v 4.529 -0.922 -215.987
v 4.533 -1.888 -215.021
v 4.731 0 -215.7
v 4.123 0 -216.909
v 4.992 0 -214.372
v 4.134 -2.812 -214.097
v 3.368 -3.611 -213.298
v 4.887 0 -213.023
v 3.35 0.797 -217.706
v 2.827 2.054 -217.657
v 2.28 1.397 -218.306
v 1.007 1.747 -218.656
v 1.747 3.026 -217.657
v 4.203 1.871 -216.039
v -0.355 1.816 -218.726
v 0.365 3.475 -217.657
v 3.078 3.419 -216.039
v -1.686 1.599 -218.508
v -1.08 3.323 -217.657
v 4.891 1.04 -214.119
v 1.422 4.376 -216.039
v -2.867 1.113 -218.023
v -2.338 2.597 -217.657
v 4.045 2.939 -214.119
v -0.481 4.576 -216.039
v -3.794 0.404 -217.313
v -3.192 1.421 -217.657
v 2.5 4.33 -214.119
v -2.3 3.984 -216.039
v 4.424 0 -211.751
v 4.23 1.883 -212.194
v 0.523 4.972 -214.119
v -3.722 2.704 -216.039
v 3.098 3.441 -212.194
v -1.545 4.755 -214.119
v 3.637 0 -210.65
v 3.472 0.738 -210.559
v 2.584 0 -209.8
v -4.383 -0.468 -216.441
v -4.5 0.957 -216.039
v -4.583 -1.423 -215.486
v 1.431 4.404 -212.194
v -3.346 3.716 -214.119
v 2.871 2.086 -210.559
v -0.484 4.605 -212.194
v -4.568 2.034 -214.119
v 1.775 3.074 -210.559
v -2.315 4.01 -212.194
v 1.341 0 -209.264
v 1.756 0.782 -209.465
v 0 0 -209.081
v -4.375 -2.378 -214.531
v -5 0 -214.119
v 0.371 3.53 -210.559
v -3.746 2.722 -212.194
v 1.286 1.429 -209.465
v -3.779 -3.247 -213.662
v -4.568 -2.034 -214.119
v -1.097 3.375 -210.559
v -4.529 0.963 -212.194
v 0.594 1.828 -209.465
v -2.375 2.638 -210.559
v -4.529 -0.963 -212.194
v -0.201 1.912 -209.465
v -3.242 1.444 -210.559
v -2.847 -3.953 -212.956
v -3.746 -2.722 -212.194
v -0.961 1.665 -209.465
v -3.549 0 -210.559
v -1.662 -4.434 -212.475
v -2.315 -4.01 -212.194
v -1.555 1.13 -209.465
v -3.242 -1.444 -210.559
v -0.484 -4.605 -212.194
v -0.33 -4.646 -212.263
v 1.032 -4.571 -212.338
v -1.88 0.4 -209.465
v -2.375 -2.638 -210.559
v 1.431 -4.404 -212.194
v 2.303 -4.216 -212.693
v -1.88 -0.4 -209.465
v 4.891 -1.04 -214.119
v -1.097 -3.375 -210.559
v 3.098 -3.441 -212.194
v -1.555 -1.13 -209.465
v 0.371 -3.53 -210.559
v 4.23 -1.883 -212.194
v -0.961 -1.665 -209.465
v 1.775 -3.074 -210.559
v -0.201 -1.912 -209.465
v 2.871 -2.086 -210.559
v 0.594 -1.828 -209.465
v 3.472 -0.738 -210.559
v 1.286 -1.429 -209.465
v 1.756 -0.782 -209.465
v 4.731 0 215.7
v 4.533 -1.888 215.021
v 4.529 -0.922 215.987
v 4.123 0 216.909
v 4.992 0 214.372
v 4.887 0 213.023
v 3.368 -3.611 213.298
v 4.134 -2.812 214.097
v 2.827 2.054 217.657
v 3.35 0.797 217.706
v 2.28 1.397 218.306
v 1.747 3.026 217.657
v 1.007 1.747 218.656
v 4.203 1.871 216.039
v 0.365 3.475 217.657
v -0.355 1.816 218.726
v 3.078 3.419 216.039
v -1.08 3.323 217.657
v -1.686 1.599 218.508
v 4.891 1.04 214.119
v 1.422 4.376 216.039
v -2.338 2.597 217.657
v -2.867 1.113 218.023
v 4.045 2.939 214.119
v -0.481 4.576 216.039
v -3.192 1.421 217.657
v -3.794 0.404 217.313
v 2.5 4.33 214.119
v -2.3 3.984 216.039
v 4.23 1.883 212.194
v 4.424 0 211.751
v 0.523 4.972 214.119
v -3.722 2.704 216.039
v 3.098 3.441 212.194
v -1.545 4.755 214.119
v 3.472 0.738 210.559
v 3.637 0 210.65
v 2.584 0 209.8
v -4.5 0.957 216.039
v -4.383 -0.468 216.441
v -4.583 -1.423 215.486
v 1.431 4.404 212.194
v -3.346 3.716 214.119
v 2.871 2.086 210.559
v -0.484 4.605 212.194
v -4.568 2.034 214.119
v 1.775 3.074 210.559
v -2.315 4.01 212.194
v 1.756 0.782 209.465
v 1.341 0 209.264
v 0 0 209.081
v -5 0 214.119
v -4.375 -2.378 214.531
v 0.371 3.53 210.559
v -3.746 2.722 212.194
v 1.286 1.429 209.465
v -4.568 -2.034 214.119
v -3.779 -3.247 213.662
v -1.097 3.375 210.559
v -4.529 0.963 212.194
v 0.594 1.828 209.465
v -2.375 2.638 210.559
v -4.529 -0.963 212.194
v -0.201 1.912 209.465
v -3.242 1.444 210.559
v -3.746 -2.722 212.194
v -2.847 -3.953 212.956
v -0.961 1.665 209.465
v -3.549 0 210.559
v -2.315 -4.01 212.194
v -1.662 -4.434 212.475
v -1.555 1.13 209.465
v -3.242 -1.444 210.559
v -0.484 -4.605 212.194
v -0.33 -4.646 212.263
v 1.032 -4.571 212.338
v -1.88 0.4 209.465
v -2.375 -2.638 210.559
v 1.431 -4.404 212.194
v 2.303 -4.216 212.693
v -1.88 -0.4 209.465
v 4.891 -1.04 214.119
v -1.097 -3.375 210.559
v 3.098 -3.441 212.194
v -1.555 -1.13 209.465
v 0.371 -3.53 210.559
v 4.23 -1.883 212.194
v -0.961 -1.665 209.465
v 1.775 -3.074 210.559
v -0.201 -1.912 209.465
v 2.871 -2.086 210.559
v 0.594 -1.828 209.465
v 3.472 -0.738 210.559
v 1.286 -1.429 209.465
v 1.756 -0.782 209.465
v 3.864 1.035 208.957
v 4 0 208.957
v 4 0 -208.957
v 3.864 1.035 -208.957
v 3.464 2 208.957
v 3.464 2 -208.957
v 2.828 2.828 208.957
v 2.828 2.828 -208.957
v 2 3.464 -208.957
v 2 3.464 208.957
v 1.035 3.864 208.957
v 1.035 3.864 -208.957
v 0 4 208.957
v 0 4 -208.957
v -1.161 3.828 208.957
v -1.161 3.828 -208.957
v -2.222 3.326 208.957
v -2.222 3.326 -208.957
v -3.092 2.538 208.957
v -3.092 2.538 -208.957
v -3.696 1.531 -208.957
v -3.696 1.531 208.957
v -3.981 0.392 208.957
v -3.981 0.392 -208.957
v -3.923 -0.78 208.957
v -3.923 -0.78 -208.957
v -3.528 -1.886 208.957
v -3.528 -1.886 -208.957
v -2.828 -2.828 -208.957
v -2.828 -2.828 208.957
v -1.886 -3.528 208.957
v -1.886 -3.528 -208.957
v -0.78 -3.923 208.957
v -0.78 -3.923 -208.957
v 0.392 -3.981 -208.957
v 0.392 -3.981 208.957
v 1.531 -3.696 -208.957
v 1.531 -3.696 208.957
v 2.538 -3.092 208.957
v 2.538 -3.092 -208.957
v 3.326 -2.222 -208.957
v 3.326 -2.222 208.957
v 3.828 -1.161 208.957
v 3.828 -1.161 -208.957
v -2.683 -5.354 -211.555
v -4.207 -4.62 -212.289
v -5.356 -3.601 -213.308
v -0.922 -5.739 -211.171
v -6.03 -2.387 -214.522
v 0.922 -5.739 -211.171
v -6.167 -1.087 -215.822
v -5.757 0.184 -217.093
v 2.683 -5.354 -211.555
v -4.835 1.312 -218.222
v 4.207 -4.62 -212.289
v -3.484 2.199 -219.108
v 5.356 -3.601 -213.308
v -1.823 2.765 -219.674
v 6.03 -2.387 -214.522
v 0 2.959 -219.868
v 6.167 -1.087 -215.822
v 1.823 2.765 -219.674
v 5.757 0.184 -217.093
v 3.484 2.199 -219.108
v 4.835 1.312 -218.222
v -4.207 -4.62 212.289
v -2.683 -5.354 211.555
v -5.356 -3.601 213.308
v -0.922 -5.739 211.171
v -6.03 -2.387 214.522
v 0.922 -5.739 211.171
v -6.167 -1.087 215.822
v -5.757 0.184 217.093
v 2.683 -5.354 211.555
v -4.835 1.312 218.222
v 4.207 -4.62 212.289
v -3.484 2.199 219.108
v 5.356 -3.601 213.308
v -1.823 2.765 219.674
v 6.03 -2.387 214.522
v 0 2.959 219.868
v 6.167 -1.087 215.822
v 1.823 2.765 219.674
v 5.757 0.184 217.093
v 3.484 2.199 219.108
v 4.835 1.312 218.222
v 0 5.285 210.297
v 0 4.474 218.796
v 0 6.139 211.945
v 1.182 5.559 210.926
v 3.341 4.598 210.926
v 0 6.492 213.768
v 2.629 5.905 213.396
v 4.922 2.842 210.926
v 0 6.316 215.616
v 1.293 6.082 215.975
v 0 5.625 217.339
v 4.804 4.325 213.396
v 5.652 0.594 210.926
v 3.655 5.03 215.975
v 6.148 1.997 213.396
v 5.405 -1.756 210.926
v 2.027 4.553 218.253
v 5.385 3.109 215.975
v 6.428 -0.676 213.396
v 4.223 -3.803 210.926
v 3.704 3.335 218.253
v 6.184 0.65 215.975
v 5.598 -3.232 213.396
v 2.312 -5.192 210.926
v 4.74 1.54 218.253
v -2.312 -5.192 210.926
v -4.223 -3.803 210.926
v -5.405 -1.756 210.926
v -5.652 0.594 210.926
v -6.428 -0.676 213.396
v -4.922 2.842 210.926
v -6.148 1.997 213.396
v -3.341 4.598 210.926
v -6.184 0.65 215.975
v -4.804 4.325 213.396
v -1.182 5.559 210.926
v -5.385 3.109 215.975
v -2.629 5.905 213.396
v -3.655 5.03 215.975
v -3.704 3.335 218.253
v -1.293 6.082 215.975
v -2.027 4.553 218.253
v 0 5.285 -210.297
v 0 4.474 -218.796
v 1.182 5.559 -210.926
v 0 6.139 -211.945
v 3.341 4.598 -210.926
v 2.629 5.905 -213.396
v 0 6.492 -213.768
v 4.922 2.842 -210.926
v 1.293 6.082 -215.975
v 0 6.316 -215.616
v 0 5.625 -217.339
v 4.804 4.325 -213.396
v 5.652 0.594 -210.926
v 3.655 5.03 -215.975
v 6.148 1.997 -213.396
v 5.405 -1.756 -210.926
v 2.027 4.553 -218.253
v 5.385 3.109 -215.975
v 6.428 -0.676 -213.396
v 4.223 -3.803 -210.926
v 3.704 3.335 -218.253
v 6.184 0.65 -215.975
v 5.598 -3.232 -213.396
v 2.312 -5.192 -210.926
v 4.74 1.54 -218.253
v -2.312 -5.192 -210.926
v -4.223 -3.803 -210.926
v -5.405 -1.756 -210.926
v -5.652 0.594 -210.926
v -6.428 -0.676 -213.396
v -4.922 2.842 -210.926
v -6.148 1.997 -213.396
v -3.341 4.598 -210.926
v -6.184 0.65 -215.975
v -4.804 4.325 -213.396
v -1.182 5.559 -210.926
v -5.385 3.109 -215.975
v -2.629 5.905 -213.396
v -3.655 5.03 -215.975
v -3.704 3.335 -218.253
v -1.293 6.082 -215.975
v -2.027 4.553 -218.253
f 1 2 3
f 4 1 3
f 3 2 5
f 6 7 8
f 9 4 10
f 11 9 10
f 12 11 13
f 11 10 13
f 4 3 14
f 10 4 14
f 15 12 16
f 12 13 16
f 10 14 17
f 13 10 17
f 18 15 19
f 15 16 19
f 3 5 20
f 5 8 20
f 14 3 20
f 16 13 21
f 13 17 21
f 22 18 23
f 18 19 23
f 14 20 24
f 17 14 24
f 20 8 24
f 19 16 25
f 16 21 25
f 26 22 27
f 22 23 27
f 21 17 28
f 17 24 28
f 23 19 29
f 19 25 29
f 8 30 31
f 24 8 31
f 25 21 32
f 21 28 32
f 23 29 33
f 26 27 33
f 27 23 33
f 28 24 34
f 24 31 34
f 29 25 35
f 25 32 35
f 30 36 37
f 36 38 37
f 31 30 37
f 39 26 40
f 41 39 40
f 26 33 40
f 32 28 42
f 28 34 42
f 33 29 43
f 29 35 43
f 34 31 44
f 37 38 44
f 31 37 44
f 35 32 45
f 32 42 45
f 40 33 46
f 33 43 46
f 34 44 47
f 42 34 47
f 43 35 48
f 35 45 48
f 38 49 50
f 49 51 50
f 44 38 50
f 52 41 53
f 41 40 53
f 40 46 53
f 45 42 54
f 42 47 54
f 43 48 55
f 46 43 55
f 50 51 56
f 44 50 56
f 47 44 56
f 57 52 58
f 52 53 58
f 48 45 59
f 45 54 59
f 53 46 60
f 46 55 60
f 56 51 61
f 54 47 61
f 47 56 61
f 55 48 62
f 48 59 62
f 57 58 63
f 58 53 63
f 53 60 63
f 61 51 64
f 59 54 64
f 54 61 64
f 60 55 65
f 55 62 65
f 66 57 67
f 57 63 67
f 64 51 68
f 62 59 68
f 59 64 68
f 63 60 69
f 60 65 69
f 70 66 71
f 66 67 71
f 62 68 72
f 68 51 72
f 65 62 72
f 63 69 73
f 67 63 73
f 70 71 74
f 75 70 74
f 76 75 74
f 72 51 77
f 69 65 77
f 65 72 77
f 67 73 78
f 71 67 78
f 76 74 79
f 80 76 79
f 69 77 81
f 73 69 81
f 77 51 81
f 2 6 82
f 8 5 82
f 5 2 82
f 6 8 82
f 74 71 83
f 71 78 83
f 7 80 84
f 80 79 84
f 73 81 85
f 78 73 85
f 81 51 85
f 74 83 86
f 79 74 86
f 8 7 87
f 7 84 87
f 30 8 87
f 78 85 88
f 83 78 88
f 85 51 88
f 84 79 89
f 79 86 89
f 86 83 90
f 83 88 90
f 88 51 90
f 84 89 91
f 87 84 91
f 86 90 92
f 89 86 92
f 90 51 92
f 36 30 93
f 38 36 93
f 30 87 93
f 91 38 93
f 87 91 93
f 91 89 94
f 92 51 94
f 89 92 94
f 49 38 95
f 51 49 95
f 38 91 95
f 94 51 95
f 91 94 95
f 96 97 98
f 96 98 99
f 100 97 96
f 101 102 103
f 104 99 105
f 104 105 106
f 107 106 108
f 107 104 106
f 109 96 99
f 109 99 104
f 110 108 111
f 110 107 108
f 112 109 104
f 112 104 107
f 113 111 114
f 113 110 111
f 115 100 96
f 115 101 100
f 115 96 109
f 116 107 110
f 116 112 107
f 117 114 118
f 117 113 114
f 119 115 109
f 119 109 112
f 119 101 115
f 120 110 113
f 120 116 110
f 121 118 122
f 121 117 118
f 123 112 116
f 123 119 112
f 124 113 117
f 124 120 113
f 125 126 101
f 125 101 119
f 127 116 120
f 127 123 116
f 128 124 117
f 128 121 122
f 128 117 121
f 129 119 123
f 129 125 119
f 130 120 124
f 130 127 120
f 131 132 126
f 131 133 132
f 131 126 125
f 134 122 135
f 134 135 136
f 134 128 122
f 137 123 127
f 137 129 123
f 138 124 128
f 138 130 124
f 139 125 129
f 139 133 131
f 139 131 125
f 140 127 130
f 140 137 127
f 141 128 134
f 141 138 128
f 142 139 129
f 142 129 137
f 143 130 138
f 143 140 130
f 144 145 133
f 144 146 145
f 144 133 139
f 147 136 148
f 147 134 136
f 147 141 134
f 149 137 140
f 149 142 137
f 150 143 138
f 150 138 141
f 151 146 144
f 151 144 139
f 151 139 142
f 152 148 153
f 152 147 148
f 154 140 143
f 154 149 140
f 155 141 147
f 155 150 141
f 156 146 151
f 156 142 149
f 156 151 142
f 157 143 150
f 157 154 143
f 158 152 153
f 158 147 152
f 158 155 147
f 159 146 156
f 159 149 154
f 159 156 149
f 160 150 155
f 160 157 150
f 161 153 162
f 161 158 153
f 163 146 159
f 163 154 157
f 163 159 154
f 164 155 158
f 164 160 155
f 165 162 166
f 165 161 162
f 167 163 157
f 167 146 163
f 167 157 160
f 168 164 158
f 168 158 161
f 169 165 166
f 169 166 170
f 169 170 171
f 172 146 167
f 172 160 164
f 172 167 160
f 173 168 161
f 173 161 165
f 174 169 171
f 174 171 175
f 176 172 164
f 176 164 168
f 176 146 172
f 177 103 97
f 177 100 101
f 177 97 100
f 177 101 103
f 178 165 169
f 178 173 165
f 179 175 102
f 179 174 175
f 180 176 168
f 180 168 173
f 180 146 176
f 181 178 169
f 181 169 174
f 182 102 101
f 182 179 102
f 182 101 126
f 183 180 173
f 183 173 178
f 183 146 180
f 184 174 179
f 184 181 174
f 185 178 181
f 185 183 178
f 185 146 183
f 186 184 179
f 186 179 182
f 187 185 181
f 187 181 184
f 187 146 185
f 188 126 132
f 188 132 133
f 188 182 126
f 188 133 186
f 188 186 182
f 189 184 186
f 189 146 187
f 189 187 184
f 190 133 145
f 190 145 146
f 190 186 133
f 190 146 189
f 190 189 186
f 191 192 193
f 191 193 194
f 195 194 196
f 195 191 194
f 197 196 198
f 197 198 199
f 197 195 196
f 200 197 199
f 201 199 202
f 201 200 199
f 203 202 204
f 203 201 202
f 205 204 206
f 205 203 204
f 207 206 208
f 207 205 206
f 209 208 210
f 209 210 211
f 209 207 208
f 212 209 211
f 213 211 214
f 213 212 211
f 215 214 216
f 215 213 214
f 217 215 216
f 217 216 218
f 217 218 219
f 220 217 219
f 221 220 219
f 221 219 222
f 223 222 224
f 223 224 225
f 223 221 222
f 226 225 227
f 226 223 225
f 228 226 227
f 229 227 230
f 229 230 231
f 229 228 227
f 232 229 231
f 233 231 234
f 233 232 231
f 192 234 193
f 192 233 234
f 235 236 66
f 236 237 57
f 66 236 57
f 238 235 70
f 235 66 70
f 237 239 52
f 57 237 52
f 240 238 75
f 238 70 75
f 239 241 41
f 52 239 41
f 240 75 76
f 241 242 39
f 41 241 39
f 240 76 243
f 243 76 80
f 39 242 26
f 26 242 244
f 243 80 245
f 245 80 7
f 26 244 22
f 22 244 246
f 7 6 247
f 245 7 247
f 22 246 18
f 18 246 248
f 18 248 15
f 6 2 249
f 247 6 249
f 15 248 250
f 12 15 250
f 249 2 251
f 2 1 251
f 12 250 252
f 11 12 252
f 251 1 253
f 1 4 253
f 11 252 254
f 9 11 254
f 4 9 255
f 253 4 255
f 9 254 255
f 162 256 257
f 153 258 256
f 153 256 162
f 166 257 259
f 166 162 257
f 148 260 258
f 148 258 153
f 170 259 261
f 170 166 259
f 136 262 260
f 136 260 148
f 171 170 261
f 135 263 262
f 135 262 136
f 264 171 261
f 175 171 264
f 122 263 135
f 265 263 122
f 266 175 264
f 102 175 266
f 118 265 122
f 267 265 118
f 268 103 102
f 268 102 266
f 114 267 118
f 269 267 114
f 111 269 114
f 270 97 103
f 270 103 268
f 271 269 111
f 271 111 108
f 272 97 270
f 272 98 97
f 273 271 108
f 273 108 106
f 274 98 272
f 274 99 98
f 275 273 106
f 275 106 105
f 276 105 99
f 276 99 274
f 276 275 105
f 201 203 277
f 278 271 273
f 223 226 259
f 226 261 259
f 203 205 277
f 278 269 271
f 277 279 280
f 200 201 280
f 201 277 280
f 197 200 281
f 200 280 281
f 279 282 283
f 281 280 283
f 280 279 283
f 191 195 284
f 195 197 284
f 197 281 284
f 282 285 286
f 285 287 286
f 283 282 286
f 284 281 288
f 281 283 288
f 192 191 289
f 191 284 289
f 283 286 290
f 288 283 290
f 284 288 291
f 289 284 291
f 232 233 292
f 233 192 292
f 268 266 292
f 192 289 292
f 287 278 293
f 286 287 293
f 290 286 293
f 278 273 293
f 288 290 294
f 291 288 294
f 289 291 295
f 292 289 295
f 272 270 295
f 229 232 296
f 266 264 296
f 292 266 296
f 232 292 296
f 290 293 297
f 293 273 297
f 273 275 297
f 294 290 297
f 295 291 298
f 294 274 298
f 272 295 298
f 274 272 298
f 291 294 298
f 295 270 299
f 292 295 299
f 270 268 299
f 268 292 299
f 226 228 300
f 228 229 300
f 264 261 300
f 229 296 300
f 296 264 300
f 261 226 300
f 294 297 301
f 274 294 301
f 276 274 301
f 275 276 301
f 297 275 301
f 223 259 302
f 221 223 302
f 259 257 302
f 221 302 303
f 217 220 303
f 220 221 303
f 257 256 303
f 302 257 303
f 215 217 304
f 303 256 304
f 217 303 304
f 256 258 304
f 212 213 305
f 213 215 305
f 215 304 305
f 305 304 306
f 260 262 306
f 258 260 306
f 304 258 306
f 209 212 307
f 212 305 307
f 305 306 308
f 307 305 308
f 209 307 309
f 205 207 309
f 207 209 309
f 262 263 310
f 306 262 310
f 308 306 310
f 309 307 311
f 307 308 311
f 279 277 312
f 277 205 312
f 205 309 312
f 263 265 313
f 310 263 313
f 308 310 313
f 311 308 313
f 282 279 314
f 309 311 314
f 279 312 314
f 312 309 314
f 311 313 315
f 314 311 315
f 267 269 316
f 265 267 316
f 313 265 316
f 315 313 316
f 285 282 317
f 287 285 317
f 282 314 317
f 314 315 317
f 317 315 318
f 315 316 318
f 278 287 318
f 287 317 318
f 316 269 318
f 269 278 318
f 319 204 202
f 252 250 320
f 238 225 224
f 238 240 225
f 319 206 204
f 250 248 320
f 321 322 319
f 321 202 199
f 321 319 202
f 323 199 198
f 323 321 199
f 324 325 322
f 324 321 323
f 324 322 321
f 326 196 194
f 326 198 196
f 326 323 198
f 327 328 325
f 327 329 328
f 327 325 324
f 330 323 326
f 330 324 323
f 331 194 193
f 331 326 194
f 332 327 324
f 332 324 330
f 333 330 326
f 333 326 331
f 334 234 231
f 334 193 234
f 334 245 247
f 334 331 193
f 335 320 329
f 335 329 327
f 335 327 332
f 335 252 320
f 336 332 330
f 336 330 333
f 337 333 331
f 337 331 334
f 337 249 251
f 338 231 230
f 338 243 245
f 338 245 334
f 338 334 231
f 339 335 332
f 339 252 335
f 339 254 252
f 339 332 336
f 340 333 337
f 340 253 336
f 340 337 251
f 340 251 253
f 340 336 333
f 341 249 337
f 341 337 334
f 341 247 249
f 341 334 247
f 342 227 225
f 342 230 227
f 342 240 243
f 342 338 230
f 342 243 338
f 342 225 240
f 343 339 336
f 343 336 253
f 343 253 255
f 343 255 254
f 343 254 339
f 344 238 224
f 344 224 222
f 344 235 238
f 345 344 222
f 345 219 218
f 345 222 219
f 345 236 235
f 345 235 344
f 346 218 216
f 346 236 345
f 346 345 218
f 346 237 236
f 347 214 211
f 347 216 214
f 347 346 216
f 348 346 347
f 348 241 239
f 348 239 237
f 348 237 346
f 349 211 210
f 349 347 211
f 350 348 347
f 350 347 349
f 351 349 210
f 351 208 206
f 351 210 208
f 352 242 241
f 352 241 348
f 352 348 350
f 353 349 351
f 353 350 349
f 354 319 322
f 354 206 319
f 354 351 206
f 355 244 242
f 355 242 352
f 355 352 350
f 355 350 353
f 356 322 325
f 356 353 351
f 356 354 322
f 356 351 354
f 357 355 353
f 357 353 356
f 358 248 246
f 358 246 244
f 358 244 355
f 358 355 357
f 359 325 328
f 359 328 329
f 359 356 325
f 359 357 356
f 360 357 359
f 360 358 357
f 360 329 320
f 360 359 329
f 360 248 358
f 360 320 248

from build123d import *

# Parameters (mm, degrees)
SKETCH1_R                = 4
BOSS_EXTRUDE1_DEPTH      = 214.080811
BOSS_EXTRUDE1_DEPTH_BACK = 214.080811
CUT_EXTRUDE1_START       = -10.192388155
SKETCH5_W                = 20
SKETCH5_H                = 5
CUT_EXTRUDE1_DEPTH       = 318.544568669


with BuildPart() as part:
    # Sketch1 → Boss-Extrude1 (new body, two sides)
    with BuildSketch(Plane.XY) as boss_extrude1_sk:
        Circle(SKETCH1_R)
    extrude(amount=BOSS_EXTRUDE1_DEPTH)
    extrude(boss_extrude1_sk.sketch, amount=-BOSS_EXTRUDE1_DEPTH_BACK)

    # Sketch3 → Revolve1 (revolve)
    with BuildSketch(Plane(origin=(0, 0, 0), x_dir=(0, 0, -1), z_dir=(1, 0, 0))):
        with BuildLine():
            Line((-220.580811107, 0), (-207.580811107, 0))
            ThreePointArc((-207.580811107, 0), (-214.080811107, 6.5), (-220.580811107, 0))
        make_face()
    revolve1 = revolve(axis=Axis((0, 0, 220.580811107), (0, 0, -1)))

    # Sketch5 → Cut-Extrude1 (cut)
    with BuildSketch(Plane(origin=(0, 107.040405554, 107.040405554), x_dir=(1, 0, 0), z_dir=(0, -0.707106781, -0.707106781)).offset(CUT_EXTRUDE1_START)):
        with Locations((0, 155.877993256)):
            Rectangle(SKETCH5_W, SKETCH5_H)
    cut_extrude1 = extrude(amount=CUT_EXTRUDE1_DEPTH, mode=Mode.SUBTRACT)

    # Sketch6 → Cut-Revolve1 (revolve, cut)
    with BuildSketch(Plane(origin=(0, 0, 0), x_dir=(1, 0, 0), z_dir=(0, 1, 0))):
        with BuildLine():
            Line((0, -209.080811107), (0, -219.080811107))
            ThreePointArc((0, -219.080811107), (5, -214.080811107), (0, -209.080811107))
        make_face()
    cut_revolve1 = revolve(axis=Axis((0, 0, 209.080811107), (0, 0, 1)), mode=Mode.SUBTRACT)

    # Mirror2: Revolve1, Cut-Extrude1, Cut-Revolve1 across plane
    add(revolve1.mirror(Plane.XY))
    add(cut_extrude1.mirror(Plane.XY), mode=Mode.SUBTRACT)
    add(cut_revolve1.mirror(Plane.XY), mode=Mode.SUBTRACT)


solid = part.part
